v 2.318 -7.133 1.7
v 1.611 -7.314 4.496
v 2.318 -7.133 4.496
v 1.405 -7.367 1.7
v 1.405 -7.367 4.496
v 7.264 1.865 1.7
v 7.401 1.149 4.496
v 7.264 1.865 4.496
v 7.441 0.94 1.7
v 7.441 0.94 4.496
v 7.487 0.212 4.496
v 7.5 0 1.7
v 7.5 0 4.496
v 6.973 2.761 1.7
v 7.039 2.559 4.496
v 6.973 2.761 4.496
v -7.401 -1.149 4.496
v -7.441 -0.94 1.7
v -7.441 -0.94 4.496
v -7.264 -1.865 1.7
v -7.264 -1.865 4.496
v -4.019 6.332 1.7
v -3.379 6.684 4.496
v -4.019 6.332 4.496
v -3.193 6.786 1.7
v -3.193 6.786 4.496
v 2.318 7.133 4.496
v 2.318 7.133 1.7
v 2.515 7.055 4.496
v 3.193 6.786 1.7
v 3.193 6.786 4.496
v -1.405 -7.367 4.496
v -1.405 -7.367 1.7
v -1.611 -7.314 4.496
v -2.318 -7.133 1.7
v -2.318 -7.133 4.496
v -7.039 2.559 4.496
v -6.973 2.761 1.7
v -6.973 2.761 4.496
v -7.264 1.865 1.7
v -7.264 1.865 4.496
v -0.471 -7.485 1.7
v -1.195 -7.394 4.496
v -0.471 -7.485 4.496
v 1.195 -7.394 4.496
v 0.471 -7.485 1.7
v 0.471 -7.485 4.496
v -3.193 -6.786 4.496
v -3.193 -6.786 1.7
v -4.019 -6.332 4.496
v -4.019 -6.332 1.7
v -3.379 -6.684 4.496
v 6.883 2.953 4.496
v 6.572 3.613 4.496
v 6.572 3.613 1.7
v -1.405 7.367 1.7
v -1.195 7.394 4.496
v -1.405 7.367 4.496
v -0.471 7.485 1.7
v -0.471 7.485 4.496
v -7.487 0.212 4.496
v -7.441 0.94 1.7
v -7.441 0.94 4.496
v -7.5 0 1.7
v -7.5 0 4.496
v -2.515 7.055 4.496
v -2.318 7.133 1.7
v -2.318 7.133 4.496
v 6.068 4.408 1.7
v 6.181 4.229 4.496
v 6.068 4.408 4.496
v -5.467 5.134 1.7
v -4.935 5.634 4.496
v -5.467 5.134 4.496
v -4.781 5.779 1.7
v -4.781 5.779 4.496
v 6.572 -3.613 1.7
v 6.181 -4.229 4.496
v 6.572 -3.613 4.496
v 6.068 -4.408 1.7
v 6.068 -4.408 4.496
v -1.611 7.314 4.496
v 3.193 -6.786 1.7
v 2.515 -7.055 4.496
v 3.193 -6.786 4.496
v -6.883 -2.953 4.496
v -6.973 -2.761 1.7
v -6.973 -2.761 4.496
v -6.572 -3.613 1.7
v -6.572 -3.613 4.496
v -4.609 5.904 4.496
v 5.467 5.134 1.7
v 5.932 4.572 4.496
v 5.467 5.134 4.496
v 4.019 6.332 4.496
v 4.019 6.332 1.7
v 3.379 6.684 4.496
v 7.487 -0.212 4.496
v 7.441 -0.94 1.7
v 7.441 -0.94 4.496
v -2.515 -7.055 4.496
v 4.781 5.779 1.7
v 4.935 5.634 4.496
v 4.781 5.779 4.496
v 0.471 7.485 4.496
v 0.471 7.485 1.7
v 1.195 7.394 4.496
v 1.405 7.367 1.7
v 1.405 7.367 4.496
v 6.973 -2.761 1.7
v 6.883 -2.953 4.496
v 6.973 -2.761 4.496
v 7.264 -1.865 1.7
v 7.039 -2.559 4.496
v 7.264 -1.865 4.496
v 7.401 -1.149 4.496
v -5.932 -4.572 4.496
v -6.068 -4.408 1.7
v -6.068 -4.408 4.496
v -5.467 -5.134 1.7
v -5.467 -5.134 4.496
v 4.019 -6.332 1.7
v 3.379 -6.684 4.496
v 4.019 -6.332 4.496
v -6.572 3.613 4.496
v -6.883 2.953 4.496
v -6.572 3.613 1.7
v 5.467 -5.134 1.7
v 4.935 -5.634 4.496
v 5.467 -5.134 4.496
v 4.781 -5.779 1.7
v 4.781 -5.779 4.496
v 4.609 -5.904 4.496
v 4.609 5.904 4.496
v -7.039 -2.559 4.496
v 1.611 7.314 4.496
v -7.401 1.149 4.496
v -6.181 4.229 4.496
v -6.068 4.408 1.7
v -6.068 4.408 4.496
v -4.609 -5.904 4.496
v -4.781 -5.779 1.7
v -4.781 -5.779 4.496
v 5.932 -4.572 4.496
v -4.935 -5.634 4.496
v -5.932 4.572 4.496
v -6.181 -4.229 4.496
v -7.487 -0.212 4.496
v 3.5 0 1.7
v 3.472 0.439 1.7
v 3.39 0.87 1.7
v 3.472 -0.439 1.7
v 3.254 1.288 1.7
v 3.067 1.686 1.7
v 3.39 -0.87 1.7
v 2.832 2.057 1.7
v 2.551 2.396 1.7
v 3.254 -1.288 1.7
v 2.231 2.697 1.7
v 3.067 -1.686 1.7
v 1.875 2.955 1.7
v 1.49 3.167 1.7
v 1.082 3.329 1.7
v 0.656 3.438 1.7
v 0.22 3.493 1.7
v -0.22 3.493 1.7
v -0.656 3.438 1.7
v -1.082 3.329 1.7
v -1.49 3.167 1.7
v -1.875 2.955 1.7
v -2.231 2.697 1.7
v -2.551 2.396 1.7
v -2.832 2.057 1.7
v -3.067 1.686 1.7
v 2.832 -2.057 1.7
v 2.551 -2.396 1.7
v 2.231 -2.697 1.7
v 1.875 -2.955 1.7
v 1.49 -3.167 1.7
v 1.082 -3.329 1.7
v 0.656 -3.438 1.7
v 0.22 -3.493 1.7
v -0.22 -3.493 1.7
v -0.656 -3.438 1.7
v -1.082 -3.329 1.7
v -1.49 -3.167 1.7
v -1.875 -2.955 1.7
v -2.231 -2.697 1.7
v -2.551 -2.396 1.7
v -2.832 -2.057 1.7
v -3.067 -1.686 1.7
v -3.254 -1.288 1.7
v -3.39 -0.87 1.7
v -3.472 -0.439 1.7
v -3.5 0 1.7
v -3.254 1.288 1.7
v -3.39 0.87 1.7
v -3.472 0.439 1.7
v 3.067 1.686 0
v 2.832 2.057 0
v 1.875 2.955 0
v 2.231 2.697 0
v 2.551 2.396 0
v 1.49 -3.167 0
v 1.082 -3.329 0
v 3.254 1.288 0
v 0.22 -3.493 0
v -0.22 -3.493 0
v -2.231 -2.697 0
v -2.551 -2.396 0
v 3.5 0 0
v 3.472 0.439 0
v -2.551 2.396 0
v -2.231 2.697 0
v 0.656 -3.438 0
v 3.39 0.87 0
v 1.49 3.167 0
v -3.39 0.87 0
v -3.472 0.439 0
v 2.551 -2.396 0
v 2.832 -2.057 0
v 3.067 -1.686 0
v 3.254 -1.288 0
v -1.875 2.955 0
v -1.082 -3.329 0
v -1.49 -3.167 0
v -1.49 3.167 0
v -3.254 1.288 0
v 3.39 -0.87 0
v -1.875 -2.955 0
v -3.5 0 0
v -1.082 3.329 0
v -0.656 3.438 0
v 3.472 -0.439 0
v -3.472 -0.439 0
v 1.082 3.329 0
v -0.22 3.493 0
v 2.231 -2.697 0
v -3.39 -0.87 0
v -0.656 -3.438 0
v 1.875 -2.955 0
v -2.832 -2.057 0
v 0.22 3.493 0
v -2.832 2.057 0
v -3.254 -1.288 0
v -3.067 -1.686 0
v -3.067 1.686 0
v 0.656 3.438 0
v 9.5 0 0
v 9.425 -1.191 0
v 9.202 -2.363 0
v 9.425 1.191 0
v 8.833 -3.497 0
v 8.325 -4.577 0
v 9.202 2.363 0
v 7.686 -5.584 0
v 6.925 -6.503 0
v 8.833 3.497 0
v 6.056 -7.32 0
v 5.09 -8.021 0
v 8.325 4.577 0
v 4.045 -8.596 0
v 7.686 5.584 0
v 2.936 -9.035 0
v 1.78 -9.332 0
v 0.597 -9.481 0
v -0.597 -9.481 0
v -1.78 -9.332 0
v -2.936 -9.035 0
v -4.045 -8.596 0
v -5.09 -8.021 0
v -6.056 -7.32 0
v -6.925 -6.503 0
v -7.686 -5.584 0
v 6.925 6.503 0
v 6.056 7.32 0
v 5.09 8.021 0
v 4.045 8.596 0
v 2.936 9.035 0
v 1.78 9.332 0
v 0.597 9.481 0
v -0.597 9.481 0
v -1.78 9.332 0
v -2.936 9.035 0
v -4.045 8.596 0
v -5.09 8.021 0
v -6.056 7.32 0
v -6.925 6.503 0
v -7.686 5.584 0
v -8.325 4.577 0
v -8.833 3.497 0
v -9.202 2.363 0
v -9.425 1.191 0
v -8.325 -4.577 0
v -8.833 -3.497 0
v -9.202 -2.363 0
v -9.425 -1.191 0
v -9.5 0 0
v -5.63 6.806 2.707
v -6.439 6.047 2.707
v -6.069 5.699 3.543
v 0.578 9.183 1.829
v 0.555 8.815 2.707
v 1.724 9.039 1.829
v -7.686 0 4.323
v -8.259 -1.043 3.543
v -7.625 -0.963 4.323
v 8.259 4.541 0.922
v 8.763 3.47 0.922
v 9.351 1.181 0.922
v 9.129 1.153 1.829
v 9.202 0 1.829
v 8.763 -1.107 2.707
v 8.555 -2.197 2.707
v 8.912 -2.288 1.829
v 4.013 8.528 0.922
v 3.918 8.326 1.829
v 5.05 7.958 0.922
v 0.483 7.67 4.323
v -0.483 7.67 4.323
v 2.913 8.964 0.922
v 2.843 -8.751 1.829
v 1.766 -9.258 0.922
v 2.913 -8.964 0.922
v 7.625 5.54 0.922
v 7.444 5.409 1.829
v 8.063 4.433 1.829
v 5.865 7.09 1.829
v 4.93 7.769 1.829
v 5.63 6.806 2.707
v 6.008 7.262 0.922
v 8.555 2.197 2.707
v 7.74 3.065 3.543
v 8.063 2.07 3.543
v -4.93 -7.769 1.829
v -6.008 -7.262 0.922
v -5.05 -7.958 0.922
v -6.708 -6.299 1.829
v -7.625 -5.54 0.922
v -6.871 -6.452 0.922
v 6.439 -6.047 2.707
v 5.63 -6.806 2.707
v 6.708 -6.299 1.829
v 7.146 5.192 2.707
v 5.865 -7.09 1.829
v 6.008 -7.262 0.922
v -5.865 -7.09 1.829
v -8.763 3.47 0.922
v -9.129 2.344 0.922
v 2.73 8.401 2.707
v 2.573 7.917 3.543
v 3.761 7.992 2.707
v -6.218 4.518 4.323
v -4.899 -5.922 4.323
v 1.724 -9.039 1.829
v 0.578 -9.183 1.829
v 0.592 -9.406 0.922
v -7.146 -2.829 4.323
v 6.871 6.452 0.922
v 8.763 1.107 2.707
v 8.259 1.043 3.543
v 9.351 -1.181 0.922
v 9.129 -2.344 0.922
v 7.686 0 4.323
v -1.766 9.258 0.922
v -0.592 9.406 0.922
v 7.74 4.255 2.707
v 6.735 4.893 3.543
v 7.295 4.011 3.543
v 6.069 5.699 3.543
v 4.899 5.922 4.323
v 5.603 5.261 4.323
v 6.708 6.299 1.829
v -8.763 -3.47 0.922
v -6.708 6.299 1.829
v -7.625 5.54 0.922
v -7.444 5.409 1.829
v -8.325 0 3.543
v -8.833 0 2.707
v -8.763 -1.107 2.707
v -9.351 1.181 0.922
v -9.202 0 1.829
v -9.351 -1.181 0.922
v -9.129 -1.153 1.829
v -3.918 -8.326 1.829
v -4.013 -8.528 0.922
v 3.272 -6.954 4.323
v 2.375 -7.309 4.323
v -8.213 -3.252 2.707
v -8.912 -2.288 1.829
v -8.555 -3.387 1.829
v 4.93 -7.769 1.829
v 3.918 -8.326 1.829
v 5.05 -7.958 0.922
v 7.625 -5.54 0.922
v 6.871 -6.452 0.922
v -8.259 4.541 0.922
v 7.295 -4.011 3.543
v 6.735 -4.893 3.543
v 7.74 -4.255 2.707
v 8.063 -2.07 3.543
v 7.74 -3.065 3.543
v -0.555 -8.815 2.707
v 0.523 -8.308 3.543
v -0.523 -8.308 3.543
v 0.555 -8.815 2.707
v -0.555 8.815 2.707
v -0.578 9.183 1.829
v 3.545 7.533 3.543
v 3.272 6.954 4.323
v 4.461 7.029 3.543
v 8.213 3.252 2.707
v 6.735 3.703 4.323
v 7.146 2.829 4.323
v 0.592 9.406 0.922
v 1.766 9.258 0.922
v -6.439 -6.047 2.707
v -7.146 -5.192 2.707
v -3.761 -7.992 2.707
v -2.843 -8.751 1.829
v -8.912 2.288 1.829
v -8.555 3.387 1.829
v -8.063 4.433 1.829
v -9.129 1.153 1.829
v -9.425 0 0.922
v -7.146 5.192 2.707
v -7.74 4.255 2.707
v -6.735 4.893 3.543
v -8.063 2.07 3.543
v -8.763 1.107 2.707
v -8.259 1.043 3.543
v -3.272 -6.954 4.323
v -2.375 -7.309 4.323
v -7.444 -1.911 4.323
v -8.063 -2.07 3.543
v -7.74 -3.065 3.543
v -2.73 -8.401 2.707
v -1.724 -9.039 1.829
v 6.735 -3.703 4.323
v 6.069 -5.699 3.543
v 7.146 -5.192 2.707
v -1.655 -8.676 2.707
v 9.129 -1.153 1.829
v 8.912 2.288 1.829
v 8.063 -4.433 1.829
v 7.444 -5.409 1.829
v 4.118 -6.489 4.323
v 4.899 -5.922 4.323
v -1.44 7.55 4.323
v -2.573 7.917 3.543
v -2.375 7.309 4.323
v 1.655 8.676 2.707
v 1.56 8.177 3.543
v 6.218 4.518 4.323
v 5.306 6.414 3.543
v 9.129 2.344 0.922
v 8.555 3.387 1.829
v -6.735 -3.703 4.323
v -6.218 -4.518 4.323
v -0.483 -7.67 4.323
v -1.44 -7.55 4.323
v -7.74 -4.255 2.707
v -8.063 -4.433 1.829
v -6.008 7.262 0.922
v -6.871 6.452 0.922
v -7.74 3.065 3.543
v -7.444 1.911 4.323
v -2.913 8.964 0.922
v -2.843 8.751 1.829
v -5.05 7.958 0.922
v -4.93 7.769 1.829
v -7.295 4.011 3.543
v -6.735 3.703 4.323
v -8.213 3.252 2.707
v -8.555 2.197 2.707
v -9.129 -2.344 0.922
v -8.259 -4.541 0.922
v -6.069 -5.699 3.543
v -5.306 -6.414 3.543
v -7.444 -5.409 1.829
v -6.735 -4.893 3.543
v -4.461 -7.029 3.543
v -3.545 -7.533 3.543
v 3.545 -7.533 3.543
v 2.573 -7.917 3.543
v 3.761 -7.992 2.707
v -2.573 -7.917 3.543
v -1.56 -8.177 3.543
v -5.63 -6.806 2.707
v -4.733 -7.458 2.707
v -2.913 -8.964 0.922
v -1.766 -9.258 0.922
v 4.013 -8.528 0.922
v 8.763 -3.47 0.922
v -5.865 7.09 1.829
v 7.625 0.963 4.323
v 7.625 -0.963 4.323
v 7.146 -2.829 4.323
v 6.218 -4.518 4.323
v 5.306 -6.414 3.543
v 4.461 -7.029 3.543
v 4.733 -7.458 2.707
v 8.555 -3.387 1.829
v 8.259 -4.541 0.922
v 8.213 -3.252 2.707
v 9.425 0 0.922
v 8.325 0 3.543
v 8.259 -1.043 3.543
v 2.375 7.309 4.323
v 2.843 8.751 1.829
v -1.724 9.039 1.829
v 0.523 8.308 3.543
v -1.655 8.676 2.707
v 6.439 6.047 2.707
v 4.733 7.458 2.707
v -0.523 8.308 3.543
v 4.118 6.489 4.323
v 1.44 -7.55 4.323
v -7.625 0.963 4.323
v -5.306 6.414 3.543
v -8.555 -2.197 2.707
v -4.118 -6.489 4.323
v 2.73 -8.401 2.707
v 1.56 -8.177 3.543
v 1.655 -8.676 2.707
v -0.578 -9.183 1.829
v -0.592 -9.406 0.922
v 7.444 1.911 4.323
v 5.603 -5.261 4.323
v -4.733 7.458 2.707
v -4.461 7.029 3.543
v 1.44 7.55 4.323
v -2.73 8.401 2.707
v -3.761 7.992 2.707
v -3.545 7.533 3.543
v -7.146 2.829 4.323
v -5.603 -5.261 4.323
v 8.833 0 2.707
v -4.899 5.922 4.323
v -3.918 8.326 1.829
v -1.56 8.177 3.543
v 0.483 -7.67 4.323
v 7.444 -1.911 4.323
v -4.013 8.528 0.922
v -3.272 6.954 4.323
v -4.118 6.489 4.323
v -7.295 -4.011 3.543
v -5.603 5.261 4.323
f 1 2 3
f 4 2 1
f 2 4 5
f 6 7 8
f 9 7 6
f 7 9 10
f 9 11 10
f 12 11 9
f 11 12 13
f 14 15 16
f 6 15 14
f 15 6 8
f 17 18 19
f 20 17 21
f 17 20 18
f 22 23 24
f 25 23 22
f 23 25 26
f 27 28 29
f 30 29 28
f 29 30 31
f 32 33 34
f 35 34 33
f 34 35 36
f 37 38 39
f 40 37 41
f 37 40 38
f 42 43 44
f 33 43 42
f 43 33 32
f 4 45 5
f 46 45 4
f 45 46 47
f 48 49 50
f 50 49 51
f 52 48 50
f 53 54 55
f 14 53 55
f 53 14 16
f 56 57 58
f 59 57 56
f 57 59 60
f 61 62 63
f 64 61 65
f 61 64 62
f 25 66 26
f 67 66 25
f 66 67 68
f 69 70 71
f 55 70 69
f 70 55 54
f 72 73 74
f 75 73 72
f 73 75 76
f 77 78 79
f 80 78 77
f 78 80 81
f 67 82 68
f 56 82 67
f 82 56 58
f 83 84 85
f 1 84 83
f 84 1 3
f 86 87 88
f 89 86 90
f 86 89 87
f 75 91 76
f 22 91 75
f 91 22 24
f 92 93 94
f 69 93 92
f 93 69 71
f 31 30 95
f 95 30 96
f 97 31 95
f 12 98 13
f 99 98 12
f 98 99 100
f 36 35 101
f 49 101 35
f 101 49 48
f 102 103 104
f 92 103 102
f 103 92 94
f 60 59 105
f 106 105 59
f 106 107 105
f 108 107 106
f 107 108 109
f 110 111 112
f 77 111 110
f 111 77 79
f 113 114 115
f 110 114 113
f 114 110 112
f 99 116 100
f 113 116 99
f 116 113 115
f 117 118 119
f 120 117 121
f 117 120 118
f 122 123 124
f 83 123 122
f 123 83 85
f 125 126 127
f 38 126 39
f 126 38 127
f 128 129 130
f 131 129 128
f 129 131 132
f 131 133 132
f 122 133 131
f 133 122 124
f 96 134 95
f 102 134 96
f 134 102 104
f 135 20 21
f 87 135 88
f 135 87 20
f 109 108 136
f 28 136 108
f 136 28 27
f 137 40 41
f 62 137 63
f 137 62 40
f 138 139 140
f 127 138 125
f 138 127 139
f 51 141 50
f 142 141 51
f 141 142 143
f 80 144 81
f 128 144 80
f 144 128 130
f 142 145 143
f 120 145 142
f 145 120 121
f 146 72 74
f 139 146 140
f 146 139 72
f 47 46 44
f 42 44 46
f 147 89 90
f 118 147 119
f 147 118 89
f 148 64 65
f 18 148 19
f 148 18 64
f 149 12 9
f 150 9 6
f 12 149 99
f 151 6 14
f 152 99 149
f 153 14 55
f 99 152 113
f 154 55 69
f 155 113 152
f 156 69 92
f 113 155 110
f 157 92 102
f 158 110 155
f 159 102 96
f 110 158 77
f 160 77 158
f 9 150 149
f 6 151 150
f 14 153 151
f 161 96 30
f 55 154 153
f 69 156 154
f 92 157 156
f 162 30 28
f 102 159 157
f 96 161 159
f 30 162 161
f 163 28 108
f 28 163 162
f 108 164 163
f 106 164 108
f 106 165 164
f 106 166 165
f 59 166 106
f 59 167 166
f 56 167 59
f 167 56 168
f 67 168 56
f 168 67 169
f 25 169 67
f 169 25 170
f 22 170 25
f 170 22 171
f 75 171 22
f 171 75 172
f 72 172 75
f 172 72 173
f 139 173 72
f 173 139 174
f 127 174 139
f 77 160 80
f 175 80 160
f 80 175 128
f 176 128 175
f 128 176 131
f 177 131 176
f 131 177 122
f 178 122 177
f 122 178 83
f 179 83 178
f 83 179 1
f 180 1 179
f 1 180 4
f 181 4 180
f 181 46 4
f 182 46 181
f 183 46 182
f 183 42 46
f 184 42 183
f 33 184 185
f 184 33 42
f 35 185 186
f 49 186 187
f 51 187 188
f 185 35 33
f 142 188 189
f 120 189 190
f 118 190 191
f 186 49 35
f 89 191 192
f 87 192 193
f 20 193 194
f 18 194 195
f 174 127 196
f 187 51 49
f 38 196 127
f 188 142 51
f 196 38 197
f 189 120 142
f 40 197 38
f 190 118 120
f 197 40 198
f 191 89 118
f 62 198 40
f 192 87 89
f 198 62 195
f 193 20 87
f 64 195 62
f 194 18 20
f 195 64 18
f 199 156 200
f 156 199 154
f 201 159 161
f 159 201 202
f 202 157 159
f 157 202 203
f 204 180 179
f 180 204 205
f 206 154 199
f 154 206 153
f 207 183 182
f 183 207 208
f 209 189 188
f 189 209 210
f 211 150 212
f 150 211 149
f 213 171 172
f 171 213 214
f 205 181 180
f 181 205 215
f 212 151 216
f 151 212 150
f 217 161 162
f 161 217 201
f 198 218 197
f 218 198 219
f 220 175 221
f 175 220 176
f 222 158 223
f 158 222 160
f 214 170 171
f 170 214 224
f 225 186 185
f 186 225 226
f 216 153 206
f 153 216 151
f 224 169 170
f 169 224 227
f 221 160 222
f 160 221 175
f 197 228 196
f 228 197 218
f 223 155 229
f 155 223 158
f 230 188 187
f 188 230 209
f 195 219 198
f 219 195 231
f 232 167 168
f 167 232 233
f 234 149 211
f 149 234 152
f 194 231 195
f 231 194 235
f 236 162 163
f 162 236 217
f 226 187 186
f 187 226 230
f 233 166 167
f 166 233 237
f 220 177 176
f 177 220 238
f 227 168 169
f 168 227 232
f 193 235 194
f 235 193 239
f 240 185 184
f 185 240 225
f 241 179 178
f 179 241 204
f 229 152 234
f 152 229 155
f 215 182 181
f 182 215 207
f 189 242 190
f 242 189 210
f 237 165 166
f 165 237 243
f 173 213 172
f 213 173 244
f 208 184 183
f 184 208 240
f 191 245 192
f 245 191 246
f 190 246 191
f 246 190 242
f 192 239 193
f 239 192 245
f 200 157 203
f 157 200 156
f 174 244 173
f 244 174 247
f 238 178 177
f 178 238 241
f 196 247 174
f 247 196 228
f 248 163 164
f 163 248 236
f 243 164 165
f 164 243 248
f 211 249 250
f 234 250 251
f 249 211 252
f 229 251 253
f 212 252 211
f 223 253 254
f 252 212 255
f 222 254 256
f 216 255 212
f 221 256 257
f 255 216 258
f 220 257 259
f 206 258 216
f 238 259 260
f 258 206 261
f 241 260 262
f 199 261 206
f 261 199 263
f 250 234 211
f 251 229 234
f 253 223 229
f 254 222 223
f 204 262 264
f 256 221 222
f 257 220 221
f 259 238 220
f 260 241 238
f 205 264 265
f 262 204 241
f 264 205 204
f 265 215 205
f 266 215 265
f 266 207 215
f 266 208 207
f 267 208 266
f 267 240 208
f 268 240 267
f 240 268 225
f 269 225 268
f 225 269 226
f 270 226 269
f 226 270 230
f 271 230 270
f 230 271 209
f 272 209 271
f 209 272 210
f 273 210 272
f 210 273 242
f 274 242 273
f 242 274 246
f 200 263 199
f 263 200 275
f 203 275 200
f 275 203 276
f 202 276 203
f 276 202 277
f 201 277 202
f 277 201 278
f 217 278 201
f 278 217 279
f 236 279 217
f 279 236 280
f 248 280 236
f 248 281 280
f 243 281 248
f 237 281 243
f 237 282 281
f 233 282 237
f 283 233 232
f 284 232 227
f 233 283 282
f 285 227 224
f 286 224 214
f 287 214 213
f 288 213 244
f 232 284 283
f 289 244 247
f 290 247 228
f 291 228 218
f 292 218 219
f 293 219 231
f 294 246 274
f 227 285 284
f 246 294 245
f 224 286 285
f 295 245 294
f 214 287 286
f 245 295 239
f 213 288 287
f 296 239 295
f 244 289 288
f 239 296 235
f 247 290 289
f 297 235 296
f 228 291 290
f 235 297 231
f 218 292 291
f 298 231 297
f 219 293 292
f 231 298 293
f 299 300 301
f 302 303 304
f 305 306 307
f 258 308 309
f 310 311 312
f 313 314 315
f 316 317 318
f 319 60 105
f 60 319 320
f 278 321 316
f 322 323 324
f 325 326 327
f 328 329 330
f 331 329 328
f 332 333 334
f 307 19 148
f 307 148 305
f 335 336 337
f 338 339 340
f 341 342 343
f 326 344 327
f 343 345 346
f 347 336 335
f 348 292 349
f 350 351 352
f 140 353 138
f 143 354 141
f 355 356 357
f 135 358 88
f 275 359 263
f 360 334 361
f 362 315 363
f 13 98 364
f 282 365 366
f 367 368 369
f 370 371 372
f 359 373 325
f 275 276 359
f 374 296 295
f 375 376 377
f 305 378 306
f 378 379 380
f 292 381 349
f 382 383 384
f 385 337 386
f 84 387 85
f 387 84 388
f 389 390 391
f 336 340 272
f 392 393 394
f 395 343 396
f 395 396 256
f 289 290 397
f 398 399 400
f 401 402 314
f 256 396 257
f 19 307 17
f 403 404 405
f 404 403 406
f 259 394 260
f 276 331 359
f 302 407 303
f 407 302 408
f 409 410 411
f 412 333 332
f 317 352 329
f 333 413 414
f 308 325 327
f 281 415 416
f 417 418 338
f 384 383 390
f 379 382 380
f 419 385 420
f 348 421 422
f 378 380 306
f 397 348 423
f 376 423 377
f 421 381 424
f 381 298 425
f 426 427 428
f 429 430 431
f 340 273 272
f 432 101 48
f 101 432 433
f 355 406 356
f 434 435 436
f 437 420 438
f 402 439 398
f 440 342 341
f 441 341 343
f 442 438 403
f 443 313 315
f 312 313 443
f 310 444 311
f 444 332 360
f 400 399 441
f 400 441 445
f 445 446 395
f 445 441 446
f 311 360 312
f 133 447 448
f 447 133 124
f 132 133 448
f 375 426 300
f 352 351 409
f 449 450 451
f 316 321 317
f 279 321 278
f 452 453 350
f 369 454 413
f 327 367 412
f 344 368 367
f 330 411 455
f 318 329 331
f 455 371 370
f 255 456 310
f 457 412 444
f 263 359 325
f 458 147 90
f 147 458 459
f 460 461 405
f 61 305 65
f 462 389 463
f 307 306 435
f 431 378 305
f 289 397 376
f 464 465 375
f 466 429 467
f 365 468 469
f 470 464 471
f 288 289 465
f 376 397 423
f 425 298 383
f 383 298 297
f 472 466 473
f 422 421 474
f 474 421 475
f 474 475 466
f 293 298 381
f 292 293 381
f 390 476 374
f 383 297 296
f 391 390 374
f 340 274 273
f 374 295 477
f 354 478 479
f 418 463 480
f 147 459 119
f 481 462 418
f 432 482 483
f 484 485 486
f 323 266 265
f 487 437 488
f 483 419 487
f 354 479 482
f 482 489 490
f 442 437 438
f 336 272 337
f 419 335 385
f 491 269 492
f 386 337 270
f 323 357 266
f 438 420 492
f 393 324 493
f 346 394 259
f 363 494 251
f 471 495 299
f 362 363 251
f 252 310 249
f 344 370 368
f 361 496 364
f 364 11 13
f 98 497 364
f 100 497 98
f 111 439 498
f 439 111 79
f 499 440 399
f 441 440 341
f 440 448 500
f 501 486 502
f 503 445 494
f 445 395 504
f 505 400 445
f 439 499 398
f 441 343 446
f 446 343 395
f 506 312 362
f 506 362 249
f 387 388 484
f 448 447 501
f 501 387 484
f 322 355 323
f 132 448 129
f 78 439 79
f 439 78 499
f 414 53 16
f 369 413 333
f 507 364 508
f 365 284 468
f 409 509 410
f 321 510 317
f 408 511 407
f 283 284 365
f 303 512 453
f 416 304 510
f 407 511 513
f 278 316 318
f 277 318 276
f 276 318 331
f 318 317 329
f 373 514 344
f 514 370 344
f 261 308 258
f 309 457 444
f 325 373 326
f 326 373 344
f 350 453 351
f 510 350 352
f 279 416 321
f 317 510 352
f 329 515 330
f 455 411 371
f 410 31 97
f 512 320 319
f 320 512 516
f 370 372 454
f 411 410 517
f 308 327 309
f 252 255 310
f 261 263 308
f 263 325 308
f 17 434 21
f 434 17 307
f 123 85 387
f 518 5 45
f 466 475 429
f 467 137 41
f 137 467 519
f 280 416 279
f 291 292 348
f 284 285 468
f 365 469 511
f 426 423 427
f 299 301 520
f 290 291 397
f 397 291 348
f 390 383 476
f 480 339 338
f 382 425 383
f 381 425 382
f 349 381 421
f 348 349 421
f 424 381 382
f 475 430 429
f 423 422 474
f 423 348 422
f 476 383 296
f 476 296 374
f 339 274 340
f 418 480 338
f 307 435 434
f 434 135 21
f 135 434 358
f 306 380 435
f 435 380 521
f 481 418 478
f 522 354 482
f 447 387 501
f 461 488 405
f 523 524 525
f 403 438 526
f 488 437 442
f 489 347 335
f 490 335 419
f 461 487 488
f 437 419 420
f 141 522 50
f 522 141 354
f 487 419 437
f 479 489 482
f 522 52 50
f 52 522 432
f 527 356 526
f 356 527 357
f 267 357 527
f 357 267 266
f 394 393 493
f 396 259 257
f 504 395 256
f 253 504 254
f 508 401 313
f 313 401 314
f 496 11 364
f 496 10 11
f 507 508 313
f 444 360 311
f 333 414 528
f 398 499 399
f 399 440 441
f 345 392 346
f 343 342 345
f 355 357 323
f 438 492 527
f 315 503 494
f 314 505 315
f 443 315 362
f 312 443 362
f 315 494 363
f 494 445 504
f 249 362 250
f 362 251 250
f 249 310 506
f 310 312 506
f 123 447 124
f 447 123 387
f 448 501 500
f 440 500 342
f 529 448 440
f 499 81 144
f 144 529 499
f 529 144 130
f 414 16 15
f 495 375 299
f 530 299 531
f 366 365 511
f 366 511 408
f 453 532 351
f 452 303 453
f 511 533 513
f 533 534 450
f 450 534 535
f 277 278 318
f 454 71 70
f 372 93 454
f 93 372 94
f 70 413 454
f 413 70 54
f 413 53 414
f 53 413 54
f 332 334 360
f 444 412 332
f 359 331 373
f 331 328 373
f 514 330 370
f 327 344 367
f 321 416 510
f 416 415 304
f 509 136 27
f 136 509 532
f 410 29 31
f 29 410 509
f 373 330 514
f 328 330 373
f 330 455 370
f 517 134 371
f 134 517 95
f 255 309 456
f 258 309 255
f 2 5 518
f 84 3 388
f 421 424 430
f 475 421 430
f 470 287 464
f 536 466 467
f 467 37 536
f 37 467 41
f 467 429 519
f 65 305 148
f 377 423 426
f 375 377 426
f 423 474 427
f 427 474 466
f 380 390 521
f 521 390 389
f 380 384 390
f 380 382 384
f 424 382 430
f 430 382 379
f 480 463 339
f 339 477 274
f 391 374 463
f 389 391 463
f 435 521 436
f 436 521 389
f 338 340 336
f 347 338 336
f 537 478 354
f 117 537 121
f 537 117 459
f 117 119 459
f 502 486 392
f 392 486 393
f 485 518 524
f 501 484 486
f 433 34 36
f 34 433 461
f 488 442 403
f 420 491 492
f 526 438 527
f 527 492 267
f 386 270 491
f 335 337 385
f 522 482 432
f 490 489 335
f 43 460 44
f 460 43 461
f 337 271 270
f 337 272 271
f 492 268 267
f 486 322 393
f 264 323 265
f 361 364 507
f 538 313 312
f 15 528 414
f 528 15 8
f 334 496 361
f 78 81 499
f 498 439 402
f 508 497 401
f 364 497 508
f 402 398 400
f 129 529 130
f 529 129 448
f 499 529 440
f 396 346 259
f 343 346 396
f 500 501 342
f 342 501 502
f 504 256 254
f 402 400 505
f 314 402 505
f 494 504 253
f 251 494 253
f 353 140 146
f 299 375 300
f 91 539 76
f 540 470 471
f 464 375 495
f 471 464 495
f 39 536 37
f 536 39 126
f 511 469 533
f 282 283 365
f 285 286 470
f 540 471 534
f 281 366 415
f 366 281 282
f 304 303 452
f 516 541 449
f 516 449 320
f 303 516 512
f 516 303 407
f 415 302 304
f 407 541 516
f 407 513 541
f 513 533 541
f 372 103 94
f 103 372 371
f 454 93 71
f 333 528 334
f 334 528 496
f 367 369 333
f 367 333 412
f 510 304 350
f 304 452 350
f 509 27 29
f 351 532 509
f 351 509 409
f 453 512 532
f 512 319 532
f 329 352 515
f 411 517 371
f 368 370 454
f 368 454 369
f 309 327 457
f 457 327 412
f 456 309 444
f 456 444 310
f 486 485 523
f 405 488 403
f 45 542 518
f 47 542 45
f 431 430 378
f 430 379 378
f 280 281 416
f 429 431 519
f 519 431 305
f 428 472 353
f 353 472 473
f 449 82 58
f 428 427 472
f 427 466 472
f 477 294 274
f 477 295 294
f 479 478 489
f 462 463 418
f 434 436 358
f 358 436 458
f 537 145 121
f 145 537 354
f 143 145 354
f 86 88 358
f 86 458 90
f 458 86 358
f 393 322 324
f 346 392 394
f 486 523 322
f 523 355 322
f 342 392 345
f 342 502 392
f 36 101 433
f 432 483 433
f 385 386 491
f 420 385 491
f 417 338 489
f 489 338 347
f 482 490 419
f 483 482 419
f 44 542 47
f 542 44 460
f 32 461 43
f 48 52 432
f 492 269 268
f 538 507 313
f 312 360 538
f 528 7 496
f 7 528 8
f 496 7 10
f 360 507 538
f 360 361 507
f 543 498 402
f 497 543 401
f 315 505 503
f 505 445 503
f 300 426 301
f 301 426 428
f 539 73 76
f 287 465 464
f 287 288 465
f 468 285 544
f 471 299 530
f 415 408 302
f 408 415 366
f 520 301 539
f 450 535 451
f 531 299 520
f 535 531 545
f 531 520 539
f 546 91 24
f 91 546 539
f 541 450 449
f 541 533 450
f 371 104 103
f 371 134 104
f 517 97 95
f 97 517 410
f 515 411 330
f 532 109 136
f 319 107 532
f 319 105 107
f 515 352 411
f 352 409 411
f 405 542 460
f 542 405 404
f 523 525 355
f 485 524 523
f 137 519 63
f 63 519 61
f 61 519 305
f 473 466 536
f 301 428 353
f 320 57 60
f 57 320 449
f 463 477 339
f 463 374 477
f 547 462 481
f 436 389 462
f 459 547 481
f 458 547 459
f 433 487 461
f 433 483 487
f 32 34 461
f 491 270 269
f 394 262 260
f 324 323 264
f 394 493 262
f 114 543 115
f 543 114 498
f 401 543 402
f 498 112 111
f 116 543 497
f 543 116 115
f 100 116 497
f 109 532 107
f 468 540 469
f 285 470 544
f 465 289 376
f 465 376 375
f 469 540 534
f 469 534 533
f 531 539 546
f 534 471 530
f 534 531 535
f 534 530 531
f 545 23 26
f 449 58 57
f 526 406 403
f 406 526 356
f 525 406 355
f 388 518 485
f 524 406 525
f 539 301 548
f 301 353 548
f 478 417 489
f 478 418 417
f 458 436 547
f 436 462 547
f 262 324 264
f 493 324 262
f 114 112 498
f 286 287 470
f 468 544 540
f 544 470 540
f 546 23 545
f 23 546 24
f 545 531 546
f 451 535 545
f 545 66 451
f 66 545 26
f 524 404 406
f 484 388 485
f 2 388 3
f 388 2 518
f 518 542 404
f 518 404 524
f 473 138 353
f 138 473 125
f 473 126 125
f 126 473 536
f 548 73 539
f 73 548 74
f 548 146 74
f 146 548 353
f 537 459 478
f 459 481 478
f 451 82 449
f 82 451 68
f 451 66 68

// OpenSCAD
HEIGHT = 5.2;
GASKET_HEIGHT = HEIGHT-3.5;

DIAMETER = 19;
GASKET_OUTER_DIAMETER = 15;
GASKET_INNER_DIAMETER = 7;

$fn = 50;

intersection() {
    difference() {
        cylinder(h = HEIGHT, r1 = DIAMETER/2, r2 = DIAMETER/2);

        union() {
            translate([0, 0, GASKET_HEIGHT])
                cylinder(h = HEIGHT,
                         r1 = GASKET_OUTER_DIAMETER/2,
                         r2 = GASKET_OUTER_DIAMETER/2
            );

            cylinder(h = HEIGHT*2,
                     r1 = GASKET_INNER_DIAMETER/2,
                     r2 = GASKET_INNER_DIAMETER/2,
                     center = true
            );
        }
    }
    scale([1, 1, sqrt(2)*2*HEIGHT/DIAMETER])
        sphere(r = DIAMETER/2);
}
